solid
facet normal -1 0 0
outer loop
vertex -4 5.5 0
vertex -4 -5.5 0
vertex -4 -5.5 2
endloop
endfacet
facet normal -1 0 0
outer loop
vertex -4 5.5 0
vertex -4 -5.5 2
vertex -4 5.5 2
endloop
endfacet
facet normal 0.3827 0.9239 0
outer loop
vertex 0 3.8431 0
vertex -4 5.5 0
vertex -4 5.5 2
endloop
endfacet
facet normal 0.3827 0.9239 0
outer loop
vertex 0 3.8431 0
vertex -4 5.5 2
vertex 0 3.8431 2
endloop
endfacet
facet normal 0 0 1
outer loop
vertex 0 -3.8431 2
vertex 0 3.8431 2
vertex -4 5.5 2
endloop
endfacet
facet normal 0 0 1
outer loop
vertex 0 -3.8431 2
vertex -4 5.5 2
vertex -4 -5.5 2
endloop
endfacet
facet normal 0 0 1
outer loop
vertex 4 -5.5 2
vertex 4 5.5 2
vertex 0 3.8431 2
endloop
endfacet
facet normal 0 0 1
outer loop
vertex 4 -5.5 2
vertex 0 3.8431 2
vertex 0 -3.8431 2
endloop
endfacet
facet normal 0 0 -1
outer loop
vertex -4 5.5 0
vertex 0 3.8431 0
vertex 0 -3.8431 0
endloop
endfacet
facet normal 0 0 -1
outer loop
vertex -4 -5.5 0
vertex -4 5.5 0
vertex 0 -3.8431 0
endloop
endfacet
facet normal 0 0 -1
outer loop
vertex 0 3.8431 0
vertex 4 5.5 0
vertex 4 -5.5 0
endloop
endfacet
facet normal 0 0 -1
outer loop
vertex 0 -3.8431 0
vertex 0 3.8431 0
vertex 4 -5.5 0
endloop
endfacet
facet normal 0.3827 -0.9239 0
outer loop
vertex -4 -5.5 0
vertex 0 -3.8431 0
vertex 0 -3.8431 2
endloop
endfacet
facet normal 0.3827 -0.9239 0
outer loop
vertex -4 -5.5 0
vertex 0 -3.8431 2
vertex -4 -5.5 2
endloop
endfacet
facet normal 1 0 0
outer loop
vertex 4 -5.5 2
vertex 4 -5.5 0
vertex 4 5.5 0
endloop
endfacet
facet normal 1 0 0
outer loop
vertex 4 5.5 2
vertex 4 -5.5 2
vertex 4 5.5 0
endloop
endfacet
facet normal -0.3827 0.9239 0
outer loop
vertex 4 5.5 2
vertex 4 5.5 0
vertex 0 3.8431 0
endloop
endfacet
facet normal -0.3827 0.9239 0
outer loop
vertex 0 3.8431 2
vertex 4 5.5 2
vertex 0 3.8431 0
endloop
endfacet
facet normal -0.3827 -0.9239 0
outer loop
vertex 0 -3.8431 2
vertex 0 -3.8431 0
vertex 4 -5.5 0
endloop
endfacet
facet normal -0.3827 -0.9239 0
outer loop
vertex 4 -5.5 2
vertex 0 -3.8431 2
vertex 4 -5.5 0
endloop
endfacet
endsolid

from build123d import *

# Parameters (mm, degrees)
AUFSATZ_LINEAR_AUSTRAGEN1_DEPTH = 2


with BuildPart() as part:
    # Skizze1 → Aufsatz-Linear austragen1 (new body)
    with BuildSketch(Plane(origin=(0, 0, 0), x_dir=(0, 1, 0), z_dir=(0, 0, 1))):
        Polygon((-5.5, 4), (5.5, 4), (3.843145751, 0), (-3.843145751, 0), align=None)
    aufsatz_linear_austragen1 = extrude(amount=AUFSATZ_LINEAR_AUSTRAGEN1_DEPTH)

    # Spiegeln1: Aufsatz-Linear austragen1 across plane
    add(aufsatz_linear_austragen1.mirror(Plane(origin=(0, 3.843145751, 2), x_dir=(0, 0, 1), z_dir=(-1, 0, 0))))


solid = part.part
